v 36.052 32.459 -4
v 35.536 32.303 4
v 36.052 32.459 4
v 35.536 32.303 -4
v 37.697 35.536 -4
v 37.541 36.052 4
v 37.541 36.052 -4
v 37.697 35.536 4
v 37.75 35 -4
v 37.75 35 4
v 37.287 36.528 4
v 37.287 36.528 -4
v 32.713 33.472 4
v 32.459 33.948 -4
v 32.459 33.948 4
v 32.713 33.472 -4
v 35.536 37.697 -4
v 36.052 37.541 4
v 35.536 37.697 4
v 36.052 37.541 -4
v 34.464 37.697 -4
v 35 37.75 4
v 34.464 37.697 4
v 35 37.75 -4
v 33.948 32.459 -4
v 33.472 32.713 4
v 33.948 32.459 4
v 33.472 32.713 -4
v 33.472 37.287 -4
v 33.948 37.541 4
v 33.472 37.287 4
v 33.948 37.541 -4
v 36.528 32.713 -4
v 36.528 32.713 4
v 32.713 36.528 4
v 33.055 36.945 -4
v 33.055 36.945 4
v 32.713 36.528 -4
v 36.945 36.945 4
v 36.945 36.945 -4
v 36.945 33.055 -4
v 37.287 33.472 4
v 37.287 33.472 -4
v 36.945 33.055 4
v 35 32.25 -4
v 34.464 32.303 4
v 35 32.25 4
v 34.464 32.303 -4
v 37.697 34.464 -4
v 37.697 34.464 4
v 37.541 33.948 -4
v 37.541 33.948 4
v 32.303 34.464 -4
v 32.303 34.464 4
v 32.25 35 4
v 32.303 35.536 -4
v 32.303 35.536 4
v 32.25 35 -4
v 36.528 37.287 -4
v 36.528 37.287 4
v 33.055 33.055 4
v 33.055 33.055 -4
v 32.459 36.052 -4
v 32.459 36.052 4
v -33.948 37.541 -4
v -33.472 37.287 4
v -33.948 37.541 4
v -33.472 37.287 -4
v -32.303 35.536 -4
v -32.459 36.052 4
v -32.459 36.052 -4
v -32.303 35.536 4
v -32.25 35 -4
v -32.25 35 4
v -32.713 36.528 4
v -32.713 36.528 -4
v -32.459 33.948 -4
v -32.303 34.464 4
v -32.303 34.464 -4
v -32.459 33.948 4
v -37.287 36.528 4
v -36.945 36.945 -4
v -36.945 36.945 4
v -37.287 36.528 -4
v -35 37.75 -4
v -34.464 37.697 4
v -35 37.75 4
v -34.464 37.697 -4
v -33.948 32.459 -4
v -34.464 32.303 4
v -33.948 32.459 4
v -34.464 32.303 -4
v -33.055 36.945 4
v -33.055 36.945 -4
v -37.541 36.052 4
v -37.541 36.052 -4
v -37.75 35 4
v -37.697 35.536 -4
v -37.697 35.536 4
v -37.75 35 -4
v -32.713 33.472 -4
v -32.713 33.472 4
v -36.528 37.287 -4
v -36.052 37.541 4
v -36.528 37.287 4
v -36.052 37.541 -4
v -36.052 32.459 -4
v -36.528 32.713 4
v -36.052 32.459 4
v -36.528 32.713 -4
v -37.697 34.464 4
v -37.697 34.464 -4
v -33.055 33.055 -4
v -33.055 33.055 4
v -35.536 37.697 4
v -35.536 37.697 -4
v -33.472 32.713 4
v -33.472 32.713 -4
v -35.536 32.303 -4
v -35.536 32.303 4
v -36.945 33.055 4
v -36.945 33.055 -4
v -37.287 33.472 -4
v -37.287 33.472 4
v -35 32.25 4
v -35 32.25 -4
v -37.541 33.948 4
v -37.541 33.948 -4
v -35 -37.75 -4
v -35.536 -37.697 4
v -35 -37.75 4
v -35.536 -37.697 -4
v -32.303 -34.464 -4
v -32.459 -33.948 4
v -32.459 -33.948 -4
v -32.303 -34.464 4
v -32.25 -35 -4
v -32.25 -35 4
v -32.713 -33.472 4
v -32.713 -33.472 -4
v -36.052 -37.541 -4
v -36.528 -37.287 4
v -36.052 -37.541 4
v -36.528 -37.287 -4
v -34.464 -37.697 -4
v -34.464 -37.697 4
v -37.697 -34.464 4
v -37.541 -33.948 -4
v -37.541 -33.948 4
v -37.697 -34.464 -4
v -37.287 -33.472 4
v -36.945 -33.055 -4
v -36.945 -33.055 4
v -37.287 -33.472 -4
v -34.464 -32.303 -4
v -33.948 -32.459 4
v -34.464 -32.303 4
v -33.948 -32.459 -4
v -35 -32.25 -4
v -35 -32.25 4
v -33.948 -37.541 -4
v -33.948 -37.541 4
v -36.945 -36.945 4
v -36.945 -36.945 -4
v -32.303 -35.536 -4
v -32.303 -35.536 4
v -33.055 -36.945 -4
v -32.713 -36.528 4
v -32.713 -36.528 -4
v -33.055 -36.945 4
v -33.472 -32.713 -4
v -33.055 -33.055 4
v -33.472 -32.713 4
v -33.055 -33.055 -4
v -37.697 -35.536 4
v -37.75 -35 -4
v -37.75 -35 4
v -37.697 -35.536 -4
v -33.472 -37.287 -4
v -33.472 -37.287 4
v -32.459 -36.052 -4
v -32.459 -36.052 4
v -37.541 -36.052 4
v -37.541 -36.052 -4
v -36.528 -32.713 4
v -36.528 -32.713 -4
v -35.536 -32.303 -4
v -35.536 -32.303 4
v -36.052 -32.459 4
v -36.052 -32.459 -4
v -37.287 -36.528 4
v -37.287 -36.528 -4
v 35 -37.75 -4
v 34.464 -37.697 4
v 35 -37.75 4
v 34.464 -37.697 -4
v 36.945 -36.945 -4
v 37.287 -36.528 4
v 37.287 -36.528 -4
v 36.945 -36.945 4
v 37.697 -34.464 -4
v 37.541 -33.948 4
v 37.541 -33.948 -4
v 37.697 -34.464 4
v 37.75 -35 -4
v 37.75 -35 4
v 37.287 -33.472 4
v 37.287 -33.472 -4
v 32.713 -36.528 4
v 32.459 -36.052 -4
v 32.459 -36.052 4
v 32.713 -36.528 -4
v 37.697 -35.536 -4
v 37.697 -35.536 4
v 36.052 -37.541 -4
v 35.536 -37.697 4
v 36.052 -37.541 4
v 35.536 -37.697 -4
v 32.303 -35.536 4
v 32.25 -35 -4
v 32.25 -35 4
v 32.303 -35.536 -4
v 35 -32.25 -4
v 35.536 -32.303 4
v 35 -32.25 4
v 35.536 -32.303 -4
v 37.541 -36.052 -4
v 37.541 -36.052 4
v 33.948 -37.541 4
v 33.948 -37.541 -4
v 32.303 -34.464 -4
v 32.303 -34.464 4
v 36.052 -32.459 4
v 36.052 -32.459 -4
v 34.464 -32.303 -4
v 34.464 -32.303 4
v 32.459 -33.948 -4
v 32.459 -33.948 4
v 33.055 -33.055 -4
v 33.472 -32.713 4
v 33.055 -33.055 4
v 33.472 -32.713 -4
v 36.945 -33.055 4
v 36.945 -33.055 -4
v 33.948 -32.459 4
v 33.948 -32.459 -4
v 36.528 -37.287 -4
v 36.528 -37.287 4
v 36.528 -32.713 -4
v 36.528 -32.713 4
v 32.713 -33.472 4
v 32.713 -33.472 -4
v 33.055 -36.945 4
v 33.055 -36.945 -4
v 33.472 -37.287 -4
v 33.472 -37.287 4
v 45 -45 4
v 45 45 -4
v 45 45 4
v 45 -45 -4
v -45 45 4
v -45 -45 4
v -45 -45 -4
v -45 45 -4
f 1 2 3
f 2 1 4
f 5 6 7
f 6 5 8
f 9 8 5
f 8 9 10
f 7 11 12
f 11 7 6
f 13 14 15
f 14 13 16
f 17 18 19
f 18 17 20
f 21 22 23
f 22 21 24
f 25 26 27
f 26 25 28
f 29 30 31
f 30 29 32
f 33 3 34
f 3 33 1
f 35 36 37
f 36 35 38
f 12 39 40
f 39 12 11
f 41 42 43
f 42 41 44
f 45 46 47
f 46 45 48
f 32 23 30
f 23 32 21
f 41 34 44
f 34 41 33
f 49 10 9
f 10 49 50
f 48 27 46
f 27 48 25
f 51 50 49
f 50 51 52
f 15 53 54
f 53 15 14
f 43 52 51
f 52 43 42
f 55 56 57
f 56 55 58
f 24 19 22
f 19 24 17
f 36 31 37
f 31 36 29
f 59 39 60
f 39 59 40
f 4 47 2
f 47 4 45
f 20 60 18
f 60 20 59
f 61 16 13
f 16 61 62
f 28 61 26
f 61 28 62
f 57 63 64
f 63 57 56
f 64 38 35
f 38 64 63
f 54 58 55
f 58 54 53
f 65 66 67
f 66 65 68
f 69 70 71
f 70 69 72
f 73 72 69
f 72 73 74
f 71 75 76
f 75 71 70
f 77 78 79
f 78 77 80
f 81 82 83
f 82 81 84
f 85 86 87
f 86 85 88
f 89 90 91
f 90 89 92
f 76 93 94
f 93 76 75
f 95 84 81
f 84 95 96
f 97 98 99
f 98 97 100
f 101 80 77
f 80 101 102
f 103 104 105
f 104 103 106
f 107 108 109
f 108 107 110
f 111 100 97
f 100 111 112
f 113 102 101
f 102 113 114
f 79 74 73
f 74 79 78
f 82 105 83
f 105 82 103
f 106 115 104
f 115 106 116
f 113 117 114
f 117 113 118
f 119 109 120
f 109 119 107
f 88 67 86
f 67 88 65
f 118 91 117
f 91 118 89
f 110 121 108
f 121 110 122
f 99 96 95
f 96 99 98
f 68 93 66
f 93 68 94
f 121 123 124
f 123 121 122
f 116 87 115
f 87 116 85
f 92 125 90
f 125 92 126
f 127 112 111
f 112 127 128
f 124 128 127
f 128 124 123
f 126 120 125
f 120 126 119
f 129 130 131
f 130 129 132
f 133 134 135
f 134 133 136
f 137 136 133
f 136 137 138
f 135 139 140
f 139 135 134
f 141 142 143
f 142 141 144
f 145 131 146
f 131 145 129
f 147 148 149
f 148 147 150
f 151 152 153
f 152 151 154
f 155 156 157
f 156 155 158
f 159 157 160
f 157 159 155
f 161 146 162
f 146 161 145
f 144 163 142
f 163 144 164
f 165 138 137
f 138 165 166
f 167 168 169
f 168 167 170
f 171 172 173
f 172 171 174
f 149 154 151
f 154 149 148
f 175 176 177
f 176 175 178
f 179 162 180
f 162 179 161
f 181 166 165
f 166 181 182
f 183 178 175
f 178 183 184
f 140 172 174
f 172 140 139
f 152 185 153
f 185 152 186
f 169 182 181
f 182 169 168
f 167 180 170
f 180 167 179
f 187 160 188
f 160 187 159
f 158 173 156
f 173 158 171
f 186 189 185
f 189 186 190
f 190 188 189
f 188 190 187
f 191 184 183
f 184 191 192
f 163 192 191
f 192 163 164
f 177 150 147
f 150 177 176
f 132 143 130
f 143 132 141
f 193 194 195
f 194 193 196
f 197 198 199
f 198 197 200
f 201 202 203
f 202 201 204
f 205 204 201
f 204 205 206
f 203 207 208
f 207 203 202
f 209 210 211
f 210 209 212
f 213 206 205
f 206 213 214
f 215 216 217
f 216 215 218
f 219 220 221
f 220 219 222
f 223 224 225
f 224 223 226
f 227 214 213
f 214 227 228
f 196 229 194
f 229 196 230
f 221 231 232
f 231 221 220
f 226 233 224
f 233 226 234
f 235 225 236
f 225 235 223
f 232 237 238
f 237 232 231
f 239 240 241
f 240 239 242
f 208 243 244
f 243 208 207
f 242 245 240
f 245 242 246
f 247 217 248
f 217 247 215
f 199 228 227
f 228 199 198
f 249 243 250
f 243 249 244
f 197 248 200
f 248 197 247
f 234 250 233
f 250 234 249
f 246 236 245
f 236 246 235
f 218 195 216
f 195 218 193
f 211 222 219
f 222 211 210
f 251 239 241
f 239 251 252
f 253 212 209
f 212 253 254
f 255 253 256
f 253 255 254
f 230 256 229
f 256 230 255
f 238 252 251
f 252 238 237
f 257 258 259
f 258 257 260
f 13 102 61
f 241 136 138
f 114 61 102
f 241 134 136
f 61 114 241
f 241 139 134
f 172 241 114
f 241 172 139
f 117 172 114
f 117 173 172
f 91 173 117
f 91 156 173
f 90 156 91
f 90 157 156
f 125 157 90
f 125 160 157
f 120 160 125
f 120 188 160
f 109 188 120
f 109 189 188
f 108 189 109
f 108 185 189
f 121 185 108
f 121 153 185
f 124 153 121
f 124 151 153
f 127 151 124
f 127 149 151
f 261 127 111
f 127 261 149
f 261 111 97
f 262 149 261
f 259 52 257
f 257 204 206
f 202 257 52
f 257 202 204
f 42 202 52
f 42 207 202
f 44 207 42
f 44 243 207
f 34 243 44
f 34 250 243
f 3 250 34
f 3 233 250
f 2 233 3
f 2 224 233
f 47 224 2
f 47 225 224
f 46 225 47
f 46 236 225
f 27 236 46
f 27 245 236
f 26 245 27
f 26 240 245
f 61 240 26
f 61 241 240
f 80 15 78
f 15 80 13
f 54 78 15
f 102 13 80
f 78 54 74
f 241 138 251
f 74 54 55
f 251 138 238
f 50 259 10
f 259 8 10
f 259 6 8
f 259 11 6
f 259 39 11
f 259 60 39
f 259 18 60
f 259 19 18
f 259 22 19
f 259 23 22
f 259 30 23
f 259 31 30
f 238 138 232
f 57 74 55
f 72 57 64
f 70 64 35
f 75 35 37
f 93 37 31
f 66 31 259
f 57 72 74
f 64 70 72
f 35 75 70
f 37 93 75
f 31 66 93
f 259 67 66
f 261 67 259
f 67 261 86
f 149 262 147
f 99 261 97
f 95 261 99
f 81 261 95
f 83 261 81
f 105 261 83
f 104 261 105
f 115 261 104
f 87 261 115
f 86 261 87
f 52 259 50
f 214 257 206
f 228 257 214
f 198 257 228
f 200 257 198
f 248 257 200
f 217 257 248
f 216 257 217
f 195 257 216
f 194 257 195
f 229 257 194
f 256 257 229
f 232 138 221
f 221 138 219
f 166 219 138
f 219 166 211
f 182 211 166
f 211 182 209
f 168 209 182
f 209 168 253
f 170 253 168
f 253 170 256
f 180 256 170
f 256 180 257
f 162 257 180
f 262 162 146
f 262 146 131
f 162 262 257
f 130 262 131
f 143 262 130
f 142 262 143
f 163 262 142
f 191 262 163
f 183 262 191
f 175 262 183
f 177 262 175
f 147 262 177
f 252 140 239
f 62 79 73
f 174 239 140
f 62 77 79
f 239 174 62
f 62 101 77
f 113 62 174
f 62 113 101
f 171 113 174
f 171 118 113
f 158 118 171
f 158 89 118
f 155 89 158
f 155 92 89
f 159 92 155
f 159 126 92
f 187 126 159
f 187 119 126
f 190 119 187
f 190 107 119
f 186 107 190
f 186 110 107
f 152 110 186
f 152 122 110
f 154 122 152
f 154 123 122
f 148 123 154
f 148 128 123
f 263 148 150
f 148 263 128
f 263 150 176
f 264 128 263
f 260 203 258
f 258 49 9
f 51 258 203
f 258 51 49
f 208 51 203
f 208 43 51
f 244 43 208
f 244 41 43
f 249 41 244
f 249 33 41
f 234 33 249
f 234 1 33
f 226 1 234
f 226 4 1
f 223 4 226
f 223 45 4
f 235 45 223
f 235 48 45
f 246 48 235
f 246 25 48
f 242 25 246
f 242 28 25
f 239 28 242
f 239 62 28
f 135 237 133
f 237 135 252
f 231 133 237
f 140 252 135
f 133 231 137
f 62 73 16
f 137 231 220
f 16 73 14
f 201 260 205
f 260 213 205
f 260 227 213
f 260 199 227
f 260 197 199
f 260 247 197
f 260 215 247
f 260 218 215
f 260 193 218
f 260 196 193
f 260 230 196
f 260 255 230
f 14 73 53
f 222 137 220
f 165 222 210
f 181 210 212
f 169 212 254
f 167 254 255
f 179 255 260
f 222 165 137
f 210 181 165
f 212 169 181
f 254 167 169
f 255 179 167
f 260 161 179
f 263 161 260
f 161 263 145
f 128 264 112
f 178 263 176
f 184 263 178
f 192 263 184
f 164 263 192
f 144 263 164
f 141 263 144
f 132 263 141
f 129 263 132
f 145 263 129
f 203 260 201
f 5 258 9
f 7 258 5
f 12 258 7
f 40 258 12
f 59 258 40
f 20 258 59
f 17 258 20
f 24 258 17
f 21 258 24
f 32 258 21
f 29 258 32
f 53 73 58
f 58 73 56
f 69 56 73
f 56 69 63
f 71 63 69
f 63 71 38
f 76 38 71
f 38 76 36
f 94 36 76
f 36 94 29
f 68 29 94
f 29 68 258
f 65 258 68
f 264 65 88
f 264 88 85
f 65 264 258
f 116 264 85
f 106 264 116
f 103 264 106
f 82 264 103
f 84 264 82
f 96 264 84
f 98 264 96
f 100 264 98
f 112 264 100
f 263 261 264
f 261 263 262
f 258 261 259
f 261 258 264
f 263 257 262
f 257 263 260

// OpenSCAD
$fn = 32;

// ----------------------------------------------------------------------
// Corner plate 90 x 90 x 8
// 4 holes, centres taken from the edge offset
// ----------------------------------------------------------------------

// --- parameters (mm) ---
plate = [90, 90, 8];  // overall size (x, y, z)
holes = 4;            // number of holes the drawing asks for
hole_d = 5.5;         // hole diameter
edge = 10;            // hole centre offset from the plate edge

// --- derived feature positions (mm) ---
corner_x = plate[0] / 2 - edge;  // = 35   corner hole X
corner_y = plate[1] / 2 - edge;  // = 35   corner hole Y
feature_centers = [
  [corner_x, corner_y],
  [-corner_x, corner_y],
  [-corner_x, -corner_y],
  [corner_x, -corner_y]
];   // hole centres the loop below drills

// plate outline, every hole drilled through with the same cutters
difference() {
  cube(plate, center = true);
  for (centre = feature_centers)
    translate([centre[0], centre[1], 0])
      cylinder(d = hole_d, h = plate[2] + 2, center = true);
}
